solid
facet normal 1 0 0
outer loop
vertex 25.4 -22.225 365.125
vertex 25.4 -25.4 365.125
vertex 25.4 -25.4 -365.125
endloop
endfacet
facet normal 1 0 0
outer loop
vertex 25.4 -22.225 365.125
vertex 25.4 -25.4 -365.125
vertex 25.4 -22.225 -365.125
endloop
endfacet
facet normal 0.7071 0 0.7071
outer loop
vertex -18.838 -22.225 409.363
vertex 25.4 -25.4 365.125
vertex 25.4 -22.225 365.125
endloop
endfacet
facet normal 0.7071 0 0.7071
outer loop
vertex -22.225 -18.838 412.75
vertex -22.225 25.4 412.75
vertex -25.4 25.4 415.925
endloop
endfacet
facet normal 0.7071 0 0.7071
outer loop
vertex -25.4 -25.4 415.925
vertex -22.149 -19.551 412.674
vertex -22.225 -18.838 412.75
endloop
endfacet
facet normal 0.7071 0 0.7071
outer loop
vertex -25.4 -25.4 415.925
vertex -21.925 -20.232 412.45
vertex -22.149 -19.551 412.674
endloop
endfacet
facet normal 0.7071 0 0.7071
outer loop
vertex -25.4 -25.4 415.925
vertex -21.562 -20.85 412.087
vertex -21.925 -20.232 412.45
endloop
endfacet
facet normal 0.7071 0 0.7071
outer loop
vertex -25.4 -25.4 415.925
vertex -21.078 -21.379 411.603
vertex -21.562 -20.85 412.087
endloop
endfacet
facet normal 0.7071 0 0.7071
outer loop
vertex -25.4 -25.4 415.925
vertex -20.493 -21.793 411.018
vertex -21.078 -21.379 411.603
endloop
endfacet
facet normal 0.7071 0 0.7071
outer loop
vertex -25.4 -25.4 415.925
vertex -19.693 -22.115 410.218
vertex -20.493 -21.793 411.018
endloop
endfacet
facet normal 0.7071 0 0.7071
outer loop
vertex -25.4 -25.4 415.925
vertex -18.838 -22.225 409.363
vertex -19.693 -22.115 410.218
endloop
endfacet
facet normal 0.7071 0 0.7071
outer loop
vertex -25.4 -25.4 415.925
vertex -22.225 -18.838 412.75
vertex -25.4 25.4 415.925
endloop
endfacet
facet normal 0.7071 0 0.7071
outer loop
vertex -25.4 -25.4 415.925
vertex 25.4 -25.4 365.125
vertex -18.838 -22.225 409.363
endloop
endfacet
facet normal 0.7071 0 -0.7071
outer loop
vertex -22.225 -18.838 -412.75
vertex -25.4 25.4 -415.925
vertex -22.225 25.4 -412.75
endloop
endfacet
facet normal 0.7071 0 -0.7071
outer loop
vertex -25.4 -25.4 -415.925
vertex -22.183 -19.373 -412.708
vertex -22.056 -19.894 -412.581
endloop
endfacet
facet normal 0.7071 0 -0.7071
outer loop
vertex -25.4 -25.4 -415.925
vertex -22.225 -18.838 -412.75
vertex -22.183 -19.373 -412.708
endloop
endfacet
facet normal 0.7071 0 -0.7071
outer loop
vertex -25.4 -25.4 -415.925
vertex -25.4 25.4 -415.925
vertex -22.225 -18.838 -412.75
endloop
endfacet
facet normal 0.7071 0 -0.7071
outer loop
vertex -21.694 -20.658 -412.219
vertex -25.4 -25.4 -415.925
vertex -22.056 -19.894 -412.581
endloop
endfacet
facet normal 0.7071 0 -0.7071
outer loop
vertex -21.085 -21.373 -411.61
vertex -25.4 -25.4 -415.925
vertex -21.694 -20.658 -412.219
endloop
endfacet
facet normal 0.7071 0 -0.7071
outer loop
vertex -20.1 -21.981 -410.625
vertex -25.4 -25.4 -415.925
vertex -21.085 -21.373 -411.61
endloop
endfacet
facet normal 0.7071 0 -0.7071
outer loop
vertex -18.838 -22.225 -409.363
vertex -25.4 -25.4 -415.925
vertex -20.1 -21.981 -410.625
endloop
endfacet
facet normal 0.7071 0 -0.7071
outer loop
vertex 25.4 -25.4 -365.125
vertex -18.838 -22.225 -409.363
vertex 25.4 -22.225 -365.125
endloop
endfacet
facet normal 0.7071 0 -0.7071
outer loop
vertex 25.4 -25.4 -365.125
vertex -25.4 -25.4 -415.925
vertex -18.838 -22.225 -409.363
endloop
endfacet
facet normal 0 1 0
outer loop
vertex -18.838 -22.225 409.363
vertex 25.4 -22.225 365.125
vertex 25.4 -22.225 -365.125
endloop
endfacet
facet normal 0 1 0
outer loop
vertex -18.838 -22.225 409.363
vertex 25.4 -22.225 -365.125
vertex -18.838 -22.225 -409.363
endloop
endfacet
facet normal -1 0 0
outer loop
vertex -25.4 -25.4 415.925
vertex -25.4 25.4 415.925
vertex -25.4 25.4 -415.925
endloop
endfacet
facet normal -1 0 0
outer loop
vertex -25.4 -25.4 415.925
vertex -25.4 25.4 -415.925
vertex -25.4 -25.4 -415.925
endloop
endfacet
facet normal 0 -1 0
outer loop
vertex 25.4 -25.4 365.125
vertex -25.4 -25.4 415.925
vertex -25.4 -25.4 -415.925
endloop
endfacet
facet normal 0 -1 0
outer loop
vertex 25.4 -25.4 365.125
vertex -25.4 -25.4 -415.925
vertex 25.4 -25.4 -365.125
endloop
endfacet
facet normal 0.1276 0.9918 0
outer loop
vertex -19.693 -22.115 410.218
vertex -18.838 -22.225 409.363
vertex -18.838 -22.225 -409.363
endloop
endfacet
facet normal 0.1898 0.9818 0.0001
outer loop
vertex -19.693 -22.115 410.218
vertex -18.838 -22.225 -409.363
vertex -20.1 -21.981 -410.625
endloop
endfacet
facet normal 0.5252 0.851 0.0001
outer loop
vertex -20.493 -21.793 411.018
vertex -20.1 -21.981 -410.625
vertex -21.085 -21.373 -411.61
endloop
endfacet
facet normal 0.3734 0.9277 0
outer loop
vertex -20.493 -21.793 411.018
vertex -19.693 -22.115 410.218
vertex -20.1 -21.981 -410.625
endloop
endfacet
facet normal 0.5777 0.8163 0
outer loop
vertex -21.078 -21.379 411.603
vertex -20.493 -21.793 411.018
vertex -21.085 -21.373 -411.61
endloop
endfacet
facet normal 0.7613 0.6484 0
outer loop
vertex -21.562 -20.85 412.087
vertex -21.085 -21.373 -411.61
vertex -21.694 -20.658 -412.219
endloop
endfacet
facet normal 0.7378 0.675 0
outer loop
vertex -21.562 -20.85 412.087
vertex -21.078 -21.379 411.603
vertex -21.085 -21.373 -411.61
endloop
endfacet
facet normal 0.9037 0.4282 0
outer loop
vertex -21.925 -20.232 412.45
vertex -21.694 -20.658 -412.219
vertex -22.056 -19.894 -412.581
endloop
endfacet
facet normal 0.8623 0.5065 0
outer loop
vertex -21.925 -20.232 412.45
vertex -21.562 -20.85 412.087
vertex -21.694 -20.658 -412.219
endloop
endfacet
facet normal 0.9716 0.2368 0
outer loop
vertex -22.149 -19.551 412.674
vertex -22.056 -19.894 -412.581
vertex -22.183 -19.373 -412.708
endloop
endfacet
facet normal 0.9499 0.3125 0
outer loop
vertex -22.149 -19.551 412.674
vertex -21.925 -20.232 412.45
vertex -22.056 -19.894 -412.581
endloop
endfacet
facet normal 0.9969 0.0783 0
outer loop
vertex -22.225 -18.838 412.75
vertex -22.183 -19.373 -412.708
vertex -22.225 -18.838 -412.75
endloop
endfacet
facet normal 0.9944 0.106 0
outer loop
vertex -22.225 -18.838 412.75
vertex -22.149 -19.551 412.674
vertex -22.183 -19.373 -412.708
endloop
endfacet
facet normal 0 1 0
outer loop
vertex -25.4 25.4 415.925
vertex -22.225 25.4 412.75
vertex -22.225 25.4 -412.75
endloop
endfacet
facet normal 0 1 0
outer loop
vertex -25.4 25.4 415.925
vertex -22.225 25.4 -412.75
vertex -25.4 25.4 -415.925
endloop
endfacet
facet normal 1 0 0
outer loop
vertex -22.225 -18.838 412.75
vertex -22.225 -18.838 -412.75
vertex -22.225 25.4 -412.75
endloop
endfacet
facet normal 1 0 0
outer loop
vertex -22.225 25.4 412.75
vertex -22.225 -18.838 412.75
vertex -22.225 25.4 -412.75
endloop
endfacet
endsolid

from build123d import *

# Parameters (mm, degrees)
BOSS_EXTRUDE1_DEPTH      = 415.925
BOSS_EXTRUDE1_DEPTH_BACK = 415.925
CUT_EXTRUDE2_DEPTH       = 48.625
CUT_EXTRUDE2_DEPTH_BACK  = 4.175


with BuildPart() as part:
    # Sketch4 → Boss-Extrude1 (new body, two sides)
    with BuildSketch(Plane.XY) as boss_extrude1_sk:
        with BuildLine():
            Line((-22.225, -18.838333333), (-22.225, 25.4))
            Line((-22.225, 25.4), (-25.4, 25.4))
            Line((-25.4, 25.4), (-25.4, -25.4))
            Line((-25.4, -25.4), (25.4, -25.4))
            Line((25.4, -25.4), (25.4, -22.225))
            Line((25.4, -22.225), (-18.838333333, -22.225))
            ThreePointArc((-18.838333333, -22.225), (-21.233068299, -21.233068299), (-22.225, -18.838333333))
        make_face()
    extrude(amount=BOSS_EXTRUDE1_DEPTH)
    extrude(boss_extrude1_sk.sketch, amount=-BOSS_EXTRUDE1_DEPTH_BACK)

    # Sketch5 → Cut-Extrude2 (cut, two sides)
    with BuildSketch(Plane(origin=(0, -22.225, 0), x_dir=(1, 0, 0), z_dir=(0, 1, 0))) as cut_extrude2_sk:
        Polygon((-25.4, 415.925), (25.4, 365.125), (25.4, 415.925), align=None)
        Polygon((25.4, -415.925), (25.4, -365.125), (-25.4, -415.925), align=None)
    extrude(amount=CUT_EXTRUDE2_DEPTH, mode=Mode.SUBTRACT)
    extrude(cut_extrude2_sk.sketch, amount=-CUT_EXTRUDE2_DEPTH_BACK, mode=Mode.SUBTRACT)


solid = part.part
